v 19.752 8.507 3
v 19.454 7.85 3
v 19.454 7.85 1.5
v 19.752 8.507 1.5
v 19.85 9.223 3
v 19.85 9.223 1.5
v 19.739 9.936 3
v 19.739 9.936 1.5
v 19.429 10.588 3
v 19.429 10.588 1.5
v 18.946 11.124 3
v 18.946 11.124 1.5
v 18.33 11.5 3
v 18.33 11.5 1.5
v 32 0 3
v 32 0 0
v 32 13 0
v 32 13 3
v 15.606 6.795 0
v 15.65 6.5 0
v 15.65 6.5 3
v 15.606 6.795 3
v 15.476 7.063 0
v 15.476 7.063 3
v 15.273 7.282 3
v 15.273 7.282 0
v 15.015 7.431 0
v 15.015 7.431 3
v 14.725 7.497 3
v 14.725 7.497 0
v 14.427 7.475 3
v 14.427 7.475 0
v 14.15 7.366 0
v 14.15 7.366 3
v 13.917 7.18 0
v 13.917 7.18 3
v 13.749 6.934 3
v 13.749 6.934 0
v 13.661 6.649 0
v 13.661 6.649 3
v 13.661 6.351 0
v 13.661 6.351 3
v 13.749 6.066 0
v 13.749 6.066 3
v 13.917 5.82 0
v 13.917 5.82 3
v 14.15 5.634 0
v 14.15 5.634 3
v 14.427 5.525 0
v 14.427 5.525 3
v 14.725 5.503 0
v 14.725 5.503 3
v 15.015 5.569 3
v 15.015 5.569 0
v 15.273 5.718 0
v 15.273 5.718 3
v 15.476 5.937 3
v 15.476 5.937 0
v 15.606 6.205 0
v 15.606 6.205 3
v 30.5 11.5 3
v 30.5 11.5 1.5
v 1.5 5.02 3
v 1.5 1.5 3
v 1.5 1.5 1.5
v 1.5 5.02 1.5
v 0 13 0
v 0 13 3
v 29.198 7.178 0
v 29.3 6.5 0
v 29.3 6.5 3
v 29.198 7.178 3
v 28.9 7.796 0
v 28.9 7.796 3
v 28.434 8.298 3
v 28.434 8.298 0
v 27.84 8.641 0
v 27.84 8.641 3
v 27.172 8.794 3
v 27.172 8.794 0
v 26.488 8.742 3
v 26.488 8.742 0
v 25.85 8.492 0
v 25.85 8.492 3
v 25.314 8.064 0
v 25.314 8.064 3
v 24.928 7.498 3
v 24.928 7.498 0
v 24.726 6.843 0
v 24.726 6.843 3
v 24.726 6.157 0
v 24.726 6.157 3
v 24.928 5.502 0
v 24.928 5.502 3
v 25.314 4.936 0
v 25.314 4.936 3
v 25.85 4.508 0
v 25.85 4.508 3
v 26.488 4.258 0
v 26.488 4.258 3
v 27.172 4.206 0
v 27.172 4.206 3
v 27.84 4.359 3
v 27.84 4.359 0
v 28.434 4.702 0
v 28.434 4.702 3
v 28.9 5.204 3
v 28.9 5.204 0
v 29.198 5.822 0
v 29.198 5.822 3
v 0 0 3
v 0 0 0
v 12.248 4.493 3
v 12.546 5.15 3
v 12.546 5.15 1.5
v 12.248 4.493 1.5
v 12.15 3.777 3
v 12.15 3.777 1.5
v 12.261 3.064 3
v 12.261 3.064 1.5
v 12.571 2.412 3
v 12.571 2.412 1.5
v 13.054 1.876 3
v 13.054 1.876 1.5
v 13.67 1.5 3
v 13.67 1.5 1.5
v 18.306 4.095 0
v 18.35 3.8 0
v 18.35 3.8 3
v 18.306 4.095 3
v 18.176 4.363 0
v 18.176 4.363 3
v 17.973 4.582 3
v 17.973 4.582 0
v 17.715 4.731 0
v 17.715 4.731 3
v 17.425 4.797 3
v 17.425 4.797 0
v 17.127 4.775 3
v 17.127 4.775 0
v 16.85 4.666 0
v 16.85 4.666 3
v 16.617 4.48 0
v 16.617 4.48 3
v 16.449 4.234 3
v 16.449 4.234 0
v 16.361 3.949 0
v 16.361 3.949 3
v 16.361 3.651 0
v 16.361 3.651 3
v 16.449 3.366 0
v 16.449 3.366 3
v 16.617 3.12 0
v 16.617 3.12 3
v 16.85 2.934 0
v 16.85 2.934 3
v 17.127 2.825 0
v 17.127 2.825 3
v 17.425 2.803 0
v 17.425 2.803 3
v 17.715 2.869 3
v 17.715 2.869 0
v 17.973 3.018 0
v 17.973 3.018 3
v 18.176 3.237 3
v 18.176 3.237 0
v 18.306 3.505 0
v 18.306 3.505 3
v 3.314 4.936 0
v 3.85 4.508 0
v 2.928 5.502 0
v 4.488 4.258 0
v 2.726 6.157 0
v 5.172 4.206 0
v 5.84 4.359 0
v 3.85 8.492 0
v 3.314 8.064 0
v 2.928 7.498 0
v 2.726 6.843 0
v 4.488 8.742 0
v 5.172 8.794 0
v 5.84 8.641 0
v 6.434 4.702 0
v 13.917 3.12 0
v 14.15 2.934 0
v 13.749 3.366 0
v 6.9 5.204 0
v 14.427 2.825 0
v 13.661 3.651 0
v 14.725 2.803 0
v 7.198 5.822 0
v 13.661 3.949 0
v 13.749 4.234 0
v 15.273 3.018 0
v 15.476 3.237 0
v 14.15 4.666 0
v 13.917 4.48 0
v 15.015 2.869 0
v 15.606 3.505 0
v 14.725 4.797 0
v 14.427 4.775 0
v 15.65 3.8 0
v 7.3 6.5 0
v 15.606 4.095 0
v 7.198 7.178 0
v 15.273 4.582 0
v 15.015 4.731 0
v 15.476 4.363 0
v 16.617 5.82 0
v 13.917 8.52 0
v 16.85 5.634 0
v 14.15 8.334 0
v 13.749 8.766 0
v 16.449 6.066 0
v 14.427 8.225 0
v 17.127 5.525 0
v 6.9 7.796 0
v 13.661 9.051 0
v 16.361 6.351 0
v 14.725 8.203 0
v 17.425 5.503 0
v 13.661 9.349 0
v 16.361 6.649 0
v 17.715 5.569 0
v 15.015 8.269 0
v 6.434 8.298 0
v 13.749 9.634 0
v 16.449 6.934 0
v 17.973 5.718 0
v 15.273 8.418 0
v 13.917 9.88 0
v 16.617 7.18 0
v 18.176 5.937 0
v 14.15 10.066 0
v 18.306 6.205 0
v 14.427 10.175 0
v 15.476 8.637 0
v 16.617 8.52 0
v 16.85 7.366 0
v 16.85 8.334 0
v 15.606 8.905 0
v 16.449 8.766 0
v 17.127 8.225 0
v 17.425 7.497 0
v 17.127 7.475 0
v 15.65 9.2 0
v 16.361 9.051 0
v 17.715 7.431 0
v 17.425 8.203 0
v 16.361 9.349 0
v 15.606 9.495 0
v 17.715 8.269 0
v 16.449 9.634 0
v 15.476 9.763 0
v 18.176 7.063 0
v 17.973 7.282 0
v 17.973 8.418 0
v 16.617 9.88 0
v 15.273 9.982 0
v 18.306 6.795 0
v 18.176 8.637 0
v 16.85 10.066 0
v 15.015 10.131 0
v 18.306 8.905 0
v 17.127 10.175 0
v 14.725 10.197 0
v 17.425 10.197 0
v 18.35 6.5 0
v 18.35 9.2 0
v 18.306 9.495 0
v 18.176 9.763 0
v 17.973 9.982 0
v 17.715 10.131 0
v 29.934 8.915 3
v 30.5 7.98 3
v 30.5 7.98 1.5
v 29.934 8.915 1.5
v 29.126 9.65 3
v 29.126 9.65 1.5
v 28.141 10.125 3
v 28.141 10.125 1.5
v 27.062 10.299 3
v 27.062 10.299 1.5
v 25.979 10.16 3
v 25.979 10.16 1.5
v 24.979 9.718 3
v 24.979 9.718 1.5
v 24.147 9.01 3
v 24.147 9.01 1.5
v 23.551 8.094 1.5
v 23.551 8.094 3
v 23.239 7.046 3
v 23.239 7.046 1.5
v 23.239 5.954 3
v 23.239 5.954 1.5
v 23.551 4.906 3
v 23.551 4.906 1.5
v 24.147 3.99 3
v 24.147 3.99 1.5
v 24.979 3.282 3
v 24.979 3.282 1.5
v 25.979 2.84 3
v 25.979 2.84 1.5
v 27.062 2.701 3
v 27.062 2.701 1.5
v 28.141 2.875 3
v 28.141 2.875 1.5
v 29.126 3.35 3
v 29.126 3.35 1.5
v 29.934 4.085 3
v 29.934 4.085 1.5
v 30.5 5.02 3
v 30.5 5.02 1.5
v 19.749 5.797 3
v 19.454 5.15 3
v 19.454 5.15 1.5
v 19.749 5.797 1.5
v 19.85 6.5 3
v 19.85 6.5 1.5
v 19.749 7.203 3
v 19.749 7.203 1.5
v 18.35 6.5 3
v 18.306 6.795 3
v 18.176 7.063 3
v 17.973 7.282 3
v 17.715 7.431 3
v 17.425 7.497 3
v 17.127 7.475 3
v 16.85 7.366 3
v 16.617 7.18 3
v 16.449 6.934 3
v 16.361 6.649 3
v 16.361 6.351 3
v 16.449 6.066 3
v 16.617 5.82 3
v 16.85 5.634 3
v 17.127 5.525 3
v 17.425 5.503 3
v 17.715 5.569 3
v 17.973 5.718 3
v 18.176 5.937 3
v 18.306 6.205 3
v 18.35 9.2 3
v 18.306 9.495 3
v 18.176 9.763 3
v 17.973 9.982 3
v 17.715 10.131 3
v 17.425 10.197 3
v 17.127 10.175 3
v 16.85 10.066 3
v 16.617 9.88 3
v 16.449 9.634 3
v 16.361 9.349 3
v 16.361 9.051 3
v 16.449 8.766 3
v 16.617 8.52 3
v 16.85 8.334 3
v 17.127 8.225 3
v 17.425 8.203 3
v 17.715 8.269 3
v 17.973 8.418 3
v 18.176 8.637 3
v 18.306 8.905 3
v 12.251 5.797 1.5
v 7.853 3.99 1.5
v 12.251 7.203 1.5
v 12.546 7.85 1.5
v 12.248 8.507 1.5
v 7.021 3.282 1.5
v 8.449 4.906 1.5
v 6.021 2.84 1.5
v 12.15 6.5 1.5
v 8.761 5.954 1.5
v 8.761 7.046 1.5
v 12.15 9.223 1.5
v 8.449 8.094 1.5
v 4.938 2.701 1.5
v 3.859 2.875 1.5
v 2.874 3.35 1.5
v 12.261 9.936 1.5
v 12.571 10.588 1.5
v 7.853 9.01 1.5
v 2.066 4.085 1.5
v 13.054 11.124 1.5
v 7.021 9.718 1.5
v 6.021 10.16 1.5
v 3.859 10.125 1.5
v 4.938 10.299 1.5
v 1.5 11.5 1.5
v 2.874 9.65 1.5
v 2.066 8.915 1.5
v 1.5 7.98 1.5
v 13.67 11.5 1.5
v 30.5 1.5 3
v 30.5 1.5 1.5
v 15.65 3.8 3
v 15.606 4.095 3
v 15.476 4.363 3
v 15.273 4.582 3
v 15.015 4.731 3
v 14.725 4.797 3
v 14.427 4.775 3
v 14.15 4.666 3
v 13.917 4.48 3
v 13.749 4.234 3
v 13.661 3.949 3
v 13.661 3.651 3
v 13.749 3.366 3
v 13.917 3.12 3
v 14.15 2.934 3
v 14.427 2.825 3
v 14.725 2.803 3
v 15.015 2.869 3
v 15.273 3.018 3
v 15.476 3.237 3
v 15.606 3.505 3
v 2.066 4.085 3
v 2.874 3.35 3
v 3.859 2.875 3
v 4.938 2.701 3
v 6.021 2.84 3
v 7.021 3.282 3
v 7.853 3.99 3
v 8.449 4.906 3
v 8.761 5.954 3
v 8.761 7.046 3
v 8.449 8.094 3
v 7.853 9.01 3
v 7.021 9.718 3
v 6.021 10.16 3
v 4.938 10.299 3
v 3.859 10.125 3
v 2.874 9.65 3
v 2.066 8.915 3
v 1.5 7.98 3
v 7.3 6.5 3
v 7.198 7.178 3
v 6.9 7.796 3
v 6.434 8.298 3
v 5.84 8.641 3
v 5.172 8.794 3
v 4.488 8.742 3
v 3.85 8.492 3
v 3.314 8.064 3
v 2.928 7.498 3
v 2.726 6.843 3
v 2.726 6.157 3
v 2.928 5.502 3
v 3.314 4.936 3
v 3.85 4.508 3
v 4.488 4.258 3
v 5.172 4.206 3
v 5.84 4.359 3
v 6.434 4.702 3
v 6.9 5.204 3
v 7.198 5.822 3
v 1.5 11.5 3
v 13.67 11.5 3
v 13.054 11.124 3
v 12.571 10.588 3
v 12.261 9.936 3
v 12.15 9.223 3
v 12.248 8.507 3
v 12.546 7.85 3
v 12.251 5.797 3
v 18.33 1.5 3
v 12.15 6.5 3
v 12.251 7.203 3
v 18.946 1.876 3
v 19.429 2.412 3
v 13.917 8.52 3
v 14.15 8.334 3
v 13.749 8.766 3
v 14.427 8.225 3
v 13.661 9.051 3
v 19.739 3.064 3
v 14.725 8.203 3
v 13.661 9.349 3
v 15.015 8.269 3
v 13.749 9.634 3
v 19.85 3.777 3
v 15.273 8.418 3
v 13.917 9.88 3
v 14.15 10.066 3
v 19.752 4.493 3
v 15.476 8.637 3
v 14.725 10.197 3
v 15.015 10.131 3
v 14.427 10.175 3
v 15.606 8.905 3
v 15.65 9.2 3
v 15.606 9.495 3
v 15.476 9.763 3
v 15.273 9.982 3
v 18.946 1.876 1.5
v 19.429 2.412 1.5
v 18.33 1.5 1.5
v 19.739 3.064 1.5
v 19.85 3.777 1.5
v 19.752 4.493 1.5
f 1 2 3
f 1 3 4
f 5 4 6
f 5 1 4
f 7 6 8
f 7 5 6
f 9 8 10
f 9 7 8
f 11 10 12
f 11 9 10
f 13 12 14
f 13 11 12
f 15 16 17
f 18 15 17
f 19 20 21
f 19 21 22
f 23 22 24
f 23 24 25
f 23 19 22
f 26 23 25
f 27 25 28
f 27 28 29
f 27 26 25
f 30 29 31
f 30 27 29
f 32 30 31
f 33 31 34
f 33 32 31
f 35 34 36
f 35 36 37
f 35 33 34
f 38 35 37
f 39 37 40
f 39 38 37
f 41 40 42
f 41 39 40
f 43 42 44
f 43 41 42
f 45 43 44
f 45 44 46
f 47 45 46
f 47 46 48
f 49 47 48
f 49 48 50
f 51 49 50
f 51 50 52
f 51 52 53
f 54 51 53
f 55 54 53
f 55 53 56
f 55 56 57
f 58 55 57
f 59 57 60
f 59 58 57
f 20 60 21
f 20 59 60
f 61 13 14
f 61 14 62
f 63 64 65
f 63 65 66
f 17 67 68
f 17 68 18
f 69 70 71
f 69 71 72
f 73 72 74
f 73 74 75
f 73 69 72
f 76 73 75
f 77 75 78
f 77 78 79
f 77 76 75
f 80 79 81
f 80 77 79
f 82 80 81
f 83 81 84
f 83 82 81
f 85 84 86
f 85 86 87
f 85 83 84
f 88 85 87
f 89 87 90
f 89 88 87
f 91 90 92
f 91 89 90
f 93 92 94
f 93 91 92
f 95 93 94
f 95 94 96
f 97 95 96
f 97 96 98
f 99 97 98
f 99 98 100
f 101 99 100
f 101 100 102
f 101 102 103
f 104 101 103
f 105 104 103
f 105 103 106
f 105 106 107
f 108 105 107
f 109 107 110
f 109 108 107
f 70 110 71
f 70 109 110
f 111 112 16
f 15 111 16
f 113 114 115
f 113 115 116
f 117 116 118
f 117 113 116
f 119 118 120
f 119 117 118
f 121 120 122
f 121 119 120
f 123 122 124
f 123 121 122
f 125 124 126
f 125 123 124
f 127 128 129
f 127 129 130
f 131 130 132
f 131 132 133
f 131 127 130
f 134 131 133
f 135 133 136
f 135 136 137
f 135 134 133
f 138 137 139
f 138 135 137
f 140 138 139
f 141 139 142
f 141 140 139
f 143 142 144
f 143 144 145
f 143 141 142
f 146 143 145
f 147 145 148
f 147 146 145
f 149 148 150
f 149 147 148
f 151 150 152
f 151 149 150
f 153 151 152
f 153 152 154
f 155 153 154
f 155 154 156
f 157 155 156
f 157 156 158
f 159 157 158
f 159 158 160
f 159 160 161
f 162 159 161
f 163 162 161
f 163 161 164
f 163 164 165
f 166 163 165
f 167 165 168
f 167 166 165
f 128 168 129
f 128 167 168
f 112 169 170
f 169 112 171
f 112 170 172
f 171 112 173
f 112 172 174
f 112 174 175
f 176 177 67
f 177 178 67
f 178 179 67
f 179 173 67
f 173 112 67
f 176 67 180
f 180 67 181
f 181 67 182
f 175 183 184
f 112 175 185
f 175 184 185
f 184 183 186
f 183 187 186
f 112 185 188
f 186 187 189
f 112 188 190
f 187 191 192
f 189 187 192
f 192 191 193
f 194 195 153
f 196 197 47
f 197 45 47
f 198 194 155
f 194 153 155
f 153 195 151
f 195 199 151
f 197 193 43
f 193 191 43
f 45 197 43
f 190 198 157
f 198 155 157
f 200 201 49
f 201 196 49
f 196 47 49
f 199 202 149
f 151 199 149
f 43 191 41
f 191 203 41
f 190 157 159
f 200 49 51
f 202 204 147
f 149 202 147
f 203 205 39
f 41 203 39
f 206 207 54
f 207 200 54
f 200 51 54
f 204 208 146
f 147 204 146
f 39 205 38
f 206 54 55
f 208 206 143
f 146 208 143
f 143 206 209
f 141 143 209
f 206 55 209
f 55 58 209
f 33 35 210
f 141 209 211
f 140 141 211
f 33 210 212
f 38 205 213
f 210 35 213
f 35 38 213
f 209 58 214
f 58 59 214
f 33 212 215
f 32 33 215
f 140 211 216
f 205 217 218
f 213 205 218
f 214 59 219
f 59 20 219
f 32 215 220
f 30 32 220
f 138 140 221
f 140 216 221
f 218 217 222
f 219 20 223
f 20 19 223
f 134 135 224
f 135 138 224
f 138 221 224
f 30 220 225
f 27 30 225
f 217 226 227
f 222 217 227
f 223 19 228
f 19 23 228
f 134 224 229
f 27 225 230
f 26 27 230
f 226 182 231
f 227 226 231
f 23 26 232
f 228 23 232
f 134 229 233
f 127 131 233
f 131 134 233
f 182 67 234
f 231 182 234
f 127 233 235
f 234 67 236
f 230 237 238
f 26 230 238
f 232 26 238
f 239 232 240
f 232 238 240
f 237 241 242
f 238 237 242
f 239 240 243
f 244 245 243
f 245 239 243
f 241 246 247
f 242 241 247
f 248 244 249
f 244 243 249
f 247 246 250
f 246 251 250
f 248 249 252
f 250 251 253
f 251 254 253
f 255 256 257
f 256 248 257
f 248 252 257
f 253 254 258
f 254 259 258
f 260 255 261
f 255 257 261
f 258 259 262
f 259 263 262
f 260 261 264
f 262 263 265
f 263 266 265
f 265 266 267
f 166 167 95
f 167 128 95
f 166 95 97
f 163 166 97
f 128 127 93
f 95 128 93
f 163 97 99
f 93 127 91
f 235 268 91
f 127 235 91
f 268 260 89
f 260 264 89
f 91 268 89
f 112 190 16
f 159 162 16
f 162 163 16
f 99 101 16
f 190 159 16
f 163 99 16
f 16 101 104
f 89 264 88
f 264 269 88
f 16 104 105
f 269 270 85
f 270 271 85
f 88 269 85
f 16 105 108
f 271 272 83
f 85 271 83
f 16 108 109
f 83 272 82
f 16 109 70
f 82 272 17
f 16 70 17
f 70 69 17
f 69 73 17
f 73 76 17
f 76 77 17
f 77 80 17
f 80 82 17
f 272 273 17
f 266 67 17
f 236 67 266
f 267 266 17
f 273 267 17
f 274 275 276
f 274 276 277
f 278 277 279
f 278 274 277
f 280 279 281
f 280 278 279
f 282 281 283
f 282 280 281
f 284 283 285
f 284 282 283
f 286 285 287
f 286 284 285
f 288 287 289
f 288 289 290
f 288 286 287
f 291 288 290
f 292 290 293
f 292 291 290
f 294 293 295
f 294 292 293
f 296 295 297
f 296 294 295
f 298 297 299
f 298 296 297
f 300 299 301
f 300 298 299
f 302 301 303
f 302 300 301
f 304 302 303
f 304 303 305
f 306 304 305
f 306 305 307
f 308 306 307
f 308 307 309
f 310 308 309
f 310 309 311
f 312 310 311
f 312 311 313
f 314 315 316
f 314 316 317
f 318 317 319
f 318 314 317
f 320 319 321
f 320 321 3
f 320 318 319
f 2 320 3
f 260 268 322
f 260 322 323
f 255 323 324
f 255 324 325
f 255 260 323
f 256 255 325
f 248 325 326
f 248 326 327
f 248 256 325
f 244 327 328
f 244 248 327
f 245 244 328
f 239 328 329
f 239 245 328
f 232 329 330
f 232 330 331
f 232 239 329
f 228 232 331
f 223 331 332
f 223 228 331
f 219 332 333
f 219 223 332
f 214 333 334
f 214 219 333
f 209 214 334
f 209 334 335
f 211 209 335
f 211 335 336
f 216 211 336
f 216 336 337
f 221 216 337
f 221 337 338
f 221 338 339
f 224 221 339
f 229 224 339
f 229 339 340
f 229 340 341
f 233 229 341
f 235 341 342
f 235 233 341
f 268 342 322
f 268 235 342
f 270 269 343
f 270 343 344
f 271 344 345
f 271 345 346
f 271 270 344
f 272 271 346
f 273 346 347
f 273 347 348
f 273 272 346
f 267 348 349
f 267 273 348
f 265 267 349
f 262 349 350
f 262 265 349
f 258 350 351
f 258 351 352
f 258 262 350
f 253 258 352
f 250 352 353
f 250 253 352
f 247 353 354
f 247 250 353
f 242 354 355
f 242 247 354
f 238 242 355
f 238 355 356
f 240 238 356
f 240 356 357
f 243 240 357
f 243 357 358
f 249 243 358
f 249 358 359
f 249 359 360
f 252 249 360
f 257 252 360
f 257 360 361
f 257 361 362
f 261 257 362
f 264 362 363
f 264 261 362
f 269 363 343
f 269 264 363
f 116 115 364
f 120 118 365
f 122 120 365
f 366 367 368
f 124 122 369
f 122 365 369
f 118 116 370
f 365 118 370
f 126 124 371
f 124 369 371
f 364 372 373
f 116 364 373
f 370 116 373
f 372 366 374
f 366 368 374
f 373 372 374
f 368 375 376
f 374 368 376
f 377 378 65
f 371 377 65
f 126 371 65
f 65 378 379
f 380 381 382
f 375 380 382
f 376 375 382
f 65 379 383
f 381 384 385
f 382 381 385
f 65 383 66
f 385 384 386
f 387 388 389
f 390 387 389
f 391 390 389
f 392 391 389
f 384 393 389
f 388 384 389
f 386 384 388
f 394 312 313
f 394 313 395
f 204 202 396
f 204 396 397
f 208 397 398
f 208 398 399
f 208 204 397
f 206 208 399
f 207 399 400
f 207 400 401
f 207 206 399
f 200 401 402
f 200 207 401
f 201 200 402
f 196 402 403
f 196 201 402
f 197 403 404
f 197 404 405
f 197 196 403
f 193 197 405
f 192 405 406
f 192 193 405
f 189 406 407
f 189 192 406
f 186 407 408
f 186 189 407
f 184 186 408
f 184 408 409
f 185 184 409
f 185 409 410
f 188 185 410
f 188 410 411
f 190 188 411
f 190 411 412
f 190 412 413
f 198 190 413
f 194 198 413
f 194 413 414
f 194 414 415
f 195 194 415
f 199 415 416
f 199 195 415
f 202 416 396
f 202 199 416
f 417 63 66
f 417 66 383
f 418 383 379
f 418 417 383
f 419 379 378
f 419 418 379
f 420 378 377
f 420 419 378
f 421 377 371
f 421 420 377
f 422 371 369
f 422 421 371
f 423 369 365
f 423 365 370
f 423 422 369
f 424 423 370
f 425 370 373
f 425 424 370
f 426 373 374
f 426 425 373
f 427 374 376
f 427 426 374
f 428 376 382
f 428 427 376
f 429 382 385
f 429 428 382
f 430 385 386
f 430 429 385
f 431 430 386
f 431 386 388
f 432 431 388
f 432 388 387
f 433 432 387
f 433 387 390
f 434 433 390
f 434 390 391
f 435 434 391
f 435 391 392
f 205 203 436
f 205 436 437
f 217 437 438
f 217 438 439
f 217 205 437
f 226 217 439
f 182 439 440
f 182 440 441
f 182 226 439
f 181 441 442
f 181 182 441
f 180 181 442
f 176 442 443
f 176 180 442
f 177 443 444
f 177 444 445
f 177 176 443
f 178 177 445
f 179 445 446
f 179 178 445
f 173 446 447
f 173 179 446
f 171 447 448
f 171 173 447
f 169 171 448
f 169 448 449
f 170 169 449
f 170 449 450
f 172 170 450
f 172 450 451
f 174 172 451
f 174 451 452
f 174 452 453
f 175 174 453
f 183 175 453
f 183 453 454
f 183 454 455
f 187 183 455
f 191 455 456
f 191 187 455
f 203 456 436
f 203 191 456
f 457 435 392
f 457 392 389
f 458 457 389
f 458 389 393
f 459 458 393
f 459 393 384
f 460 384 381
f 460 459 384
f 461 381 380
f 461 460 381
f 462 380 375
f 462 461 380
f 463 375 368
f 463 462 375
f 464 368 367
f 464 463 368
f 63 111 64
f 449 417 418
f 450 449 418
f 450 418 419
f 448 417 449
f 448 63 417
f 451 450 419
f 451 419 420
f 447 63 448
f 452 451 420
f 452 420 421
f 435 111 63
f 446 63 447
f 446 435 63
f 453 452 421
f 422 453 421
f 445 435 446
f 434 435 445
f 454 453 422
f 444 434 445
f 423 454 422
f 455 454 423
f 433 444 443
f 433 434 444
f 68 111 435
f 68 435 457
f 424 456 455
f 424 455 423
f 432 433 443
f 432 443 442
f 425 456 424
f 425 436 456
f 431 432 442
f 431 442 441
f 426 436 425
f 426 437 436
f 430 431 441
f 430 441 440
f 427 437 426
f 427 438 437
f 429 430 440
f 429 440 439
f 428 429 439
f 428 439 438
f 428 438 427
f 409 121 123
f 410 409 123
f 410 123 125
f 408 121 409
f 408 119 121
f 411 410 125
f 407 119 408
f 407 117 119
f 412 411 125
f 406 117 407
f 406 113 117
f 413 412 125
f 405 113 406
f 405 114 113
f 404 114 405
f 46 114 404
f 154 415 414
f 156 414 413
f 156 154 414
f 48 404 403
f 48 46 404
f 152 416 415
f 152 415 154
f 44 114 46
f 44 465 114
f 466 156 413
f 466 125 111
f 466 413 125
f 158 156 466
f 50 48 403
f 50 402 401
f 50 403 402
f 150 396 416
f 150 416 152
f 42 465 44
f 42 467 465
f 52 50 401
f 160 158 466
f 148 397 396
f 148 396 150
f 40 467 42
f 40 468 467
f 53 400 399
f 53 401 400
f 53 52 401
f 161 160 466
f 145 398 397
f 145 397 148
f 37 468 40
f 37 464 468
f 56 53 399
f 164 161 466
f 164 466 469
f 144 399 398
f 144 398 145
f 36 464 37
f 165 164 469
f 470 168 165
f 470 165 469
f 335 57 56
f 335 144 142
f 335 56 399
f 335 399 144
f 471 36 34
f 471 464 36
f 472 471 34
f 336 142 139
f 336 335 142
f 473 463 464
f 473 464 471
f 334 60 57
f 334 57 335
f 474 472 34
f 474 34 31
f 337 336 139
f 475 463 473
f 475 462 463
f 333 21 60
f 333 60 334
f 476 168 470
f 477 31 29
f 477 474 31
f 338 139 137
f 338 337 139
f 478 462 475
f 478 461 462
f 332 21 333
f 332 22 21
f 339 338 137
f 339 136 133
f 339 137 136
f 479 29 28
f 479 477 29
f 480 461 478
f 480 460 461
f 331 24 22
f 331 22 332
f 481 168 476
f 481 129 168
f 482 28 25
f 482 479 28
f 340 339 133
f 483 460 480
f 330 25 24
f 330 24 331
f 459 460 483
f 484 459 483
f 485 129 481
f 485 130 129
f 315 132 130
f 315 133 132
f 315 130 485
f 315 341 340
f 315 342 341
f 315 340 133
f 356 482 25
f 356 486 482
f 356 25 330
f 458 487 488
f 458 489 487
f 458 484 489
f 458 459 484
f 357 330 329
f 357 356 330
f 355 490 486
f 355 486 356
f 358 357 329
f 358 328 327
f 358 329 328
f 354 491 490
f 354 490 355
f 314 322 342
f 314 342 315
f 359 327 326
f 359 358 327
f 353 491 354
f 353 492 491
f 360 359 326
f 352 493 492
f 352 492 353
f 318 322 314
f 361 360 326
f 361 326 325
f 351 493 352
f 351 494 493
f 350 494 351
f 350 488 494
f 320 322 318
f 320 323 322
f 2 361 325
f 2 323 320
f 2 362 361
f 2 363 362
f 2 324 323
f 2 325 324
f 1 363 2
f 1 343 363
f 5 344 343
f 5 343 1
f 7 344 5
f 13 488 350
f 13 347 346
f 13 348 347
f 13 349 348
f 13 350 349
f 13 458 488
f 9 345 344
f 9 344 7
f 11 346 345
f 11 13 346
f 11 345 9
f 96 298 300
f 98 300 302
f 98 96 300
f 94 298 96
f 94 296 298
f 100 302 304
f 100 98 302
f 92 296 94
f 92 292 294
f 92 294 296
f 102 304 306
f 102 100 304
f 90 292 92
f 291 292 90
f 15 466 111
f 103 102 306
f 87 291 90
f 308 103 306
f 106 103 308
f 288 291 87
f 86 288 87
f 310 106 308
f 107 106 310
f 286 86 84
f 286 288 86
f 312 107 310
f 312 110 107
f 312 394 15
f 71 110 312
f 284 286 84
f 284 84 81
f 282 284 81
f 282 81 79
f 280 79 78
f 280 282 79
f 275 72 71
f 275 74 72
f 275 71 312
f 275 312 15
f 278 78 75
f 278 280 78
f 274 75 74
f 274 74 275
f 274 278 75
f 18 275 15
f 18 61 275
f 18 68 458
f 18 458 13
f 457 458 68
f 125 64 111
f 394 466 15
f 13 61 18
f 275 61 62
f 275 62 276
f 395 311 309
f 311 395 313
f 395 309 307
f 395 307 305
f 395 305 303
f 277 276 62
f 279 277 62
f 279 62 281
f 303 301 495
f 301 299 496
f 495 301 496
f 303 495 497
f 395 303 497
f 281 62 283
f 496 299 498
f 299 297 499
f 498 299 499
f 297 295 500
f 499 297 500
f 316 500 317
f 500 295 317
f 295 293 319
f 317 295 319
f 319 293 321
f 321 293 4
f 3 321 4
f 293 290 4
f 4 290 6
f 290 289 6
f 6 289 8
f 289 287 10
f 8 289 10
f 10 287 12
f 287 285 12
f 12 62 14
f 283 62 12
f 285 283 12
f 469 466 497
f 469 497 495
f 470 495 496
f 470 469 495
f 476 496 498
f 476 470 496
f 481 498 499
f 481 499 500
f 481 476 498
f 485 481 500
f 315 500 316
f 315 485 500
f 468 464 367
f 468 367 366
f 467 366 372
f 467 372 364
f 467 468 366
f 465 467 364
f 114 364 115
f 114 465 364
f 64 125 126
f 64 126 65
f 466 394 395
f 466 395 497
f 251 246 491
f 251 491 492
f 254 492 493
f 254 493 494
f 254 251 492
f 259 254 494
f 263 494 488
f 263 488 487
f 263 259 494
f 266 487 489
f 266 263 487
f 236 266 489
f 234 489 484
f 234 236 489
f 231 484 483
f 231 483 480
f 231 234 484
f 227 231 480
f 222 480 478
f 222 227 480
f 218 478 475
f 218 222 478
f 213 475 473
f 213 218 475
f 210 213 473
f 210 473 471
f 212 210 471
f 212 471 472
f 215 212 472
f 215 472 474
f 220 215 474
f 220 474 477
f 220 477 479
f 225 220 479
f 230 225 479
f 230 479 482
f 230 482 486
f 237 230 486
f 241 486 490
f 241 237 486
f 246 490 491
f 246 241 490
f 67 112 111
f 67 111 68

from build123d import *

# Parameters (mm, degrees)
ESQUISSE1_W             = 32
ESQUISSE1_H             = 13
ESQUISSE1_R             = 2.3
ESQUISSE1_R_2           = 1
BOSS_EXTRU_1_DEPTH      = 3
ENL_V_MAT_EXTRU_1_DEPTH = 1.5


with BuildPart() as part:
    # Esquisse1 → Boss.-Extru.1 (new body)
    with BuildSketch(Plane.XY):
        with Locations((16, 6.5)):
            Rectangle(ESQUISSE1_W, ESQUISSE1_H)
        with Locations((5, 6.5)):
            Circle(ESQUISSE1_R, mode=Mode.SUBTRACT)
        with Locations((27, 6.5)):
            Circle(ESQUISSE1_R, mode=Mode.SUBTRACT)
        with Locations((14.65, 9.2)):
            Circle(ESQUISSE1_R_2, mode=Mode.SUBTRACT)
        with Locations((17.35, 9.2)):
            Circle(ESQUISSE1_R_2, mode=Mode.SUBTRACT)
        with Locations((17.35, 6.5)):
            Circle(ESQUISSE1_R_2, mode=Mode.SUBTRACT)
        with Locations((14.65, 3.8)):
            Circle(ESQUISSE1_R_2, mode=Mode.SUBTRACT)
        with Locations((14.65, 6.5)):
            Circle(ESQUISSE1_R_2, mode=Mode.SUBTRACT)
        with Locations((17.35, 3.8)):
            Circle(ESQUISSE1_R_2, mode=Mode.SUBTRACT)
    extrude(amount=BOSS_EXTRU_1_DEPTH)

    # Esquisse2 → Enlèv. mat.-Extru.1 (cut)
    with BuildSketch(Plane.XY.offset(3)):
        with BuildLine():
            Line((1.5, 11.5), (13.670204103, 11.5))
            ThreePointArc((13.670204103, 11.5), (12.260789898, 9.935985793), (12.545837459, 7.85))
            ThreePointArc((12.545837459, 7.85), (12.15, 6.5), (12.545837459, 5.15))
            ThreePointArc((12.545837459, 5.15), (12.260789898, 3.064014207), (13.670204103, 1.5))
            Line((13.670204103, 1.5), (1.5, 1.5))
            Line((1.5, 1.5), (1.5, 5.020135141))
            ThreePointArc((1.5, 5.020135141), (8.8, 6.5), (1.5, 7.979864859))
            Line((1.5, 7.979864859), (1.5, 11.5))
        make_face()
        with BuildLine():
            Line((30.5, 1.5), (18.329795897, 1.5))
            ThreePointArc((18.329795897, 1.5), (19.739210102, 3.064014207), (19.454162541, 5.15))
            ThreePointArc((19.454162541, 5.15), (19.85, 6.5), (19.454162541, 7.85))
            ThreePointArc((19.454162541, 7.85), (19.739210102, 9.935985793), (18.329795897, 11.5))
            Line((18.329795897, 11.5), (30.5, 11.5))
            Line((30.5, 11.5), (30.5, 7.979864859))
            ThreePointArc((30.5, 7.979864859), (23.2, 6.5), (30.5, 5.020135141))
            Line((30.5, 5.020135141), (30.5, 1.5))
        make_face()
    extrude(amount=-ENL_V_MAT_EXTRU_1_DEPTH, mode=Mode.SUBTRACT)


solid = part.part
